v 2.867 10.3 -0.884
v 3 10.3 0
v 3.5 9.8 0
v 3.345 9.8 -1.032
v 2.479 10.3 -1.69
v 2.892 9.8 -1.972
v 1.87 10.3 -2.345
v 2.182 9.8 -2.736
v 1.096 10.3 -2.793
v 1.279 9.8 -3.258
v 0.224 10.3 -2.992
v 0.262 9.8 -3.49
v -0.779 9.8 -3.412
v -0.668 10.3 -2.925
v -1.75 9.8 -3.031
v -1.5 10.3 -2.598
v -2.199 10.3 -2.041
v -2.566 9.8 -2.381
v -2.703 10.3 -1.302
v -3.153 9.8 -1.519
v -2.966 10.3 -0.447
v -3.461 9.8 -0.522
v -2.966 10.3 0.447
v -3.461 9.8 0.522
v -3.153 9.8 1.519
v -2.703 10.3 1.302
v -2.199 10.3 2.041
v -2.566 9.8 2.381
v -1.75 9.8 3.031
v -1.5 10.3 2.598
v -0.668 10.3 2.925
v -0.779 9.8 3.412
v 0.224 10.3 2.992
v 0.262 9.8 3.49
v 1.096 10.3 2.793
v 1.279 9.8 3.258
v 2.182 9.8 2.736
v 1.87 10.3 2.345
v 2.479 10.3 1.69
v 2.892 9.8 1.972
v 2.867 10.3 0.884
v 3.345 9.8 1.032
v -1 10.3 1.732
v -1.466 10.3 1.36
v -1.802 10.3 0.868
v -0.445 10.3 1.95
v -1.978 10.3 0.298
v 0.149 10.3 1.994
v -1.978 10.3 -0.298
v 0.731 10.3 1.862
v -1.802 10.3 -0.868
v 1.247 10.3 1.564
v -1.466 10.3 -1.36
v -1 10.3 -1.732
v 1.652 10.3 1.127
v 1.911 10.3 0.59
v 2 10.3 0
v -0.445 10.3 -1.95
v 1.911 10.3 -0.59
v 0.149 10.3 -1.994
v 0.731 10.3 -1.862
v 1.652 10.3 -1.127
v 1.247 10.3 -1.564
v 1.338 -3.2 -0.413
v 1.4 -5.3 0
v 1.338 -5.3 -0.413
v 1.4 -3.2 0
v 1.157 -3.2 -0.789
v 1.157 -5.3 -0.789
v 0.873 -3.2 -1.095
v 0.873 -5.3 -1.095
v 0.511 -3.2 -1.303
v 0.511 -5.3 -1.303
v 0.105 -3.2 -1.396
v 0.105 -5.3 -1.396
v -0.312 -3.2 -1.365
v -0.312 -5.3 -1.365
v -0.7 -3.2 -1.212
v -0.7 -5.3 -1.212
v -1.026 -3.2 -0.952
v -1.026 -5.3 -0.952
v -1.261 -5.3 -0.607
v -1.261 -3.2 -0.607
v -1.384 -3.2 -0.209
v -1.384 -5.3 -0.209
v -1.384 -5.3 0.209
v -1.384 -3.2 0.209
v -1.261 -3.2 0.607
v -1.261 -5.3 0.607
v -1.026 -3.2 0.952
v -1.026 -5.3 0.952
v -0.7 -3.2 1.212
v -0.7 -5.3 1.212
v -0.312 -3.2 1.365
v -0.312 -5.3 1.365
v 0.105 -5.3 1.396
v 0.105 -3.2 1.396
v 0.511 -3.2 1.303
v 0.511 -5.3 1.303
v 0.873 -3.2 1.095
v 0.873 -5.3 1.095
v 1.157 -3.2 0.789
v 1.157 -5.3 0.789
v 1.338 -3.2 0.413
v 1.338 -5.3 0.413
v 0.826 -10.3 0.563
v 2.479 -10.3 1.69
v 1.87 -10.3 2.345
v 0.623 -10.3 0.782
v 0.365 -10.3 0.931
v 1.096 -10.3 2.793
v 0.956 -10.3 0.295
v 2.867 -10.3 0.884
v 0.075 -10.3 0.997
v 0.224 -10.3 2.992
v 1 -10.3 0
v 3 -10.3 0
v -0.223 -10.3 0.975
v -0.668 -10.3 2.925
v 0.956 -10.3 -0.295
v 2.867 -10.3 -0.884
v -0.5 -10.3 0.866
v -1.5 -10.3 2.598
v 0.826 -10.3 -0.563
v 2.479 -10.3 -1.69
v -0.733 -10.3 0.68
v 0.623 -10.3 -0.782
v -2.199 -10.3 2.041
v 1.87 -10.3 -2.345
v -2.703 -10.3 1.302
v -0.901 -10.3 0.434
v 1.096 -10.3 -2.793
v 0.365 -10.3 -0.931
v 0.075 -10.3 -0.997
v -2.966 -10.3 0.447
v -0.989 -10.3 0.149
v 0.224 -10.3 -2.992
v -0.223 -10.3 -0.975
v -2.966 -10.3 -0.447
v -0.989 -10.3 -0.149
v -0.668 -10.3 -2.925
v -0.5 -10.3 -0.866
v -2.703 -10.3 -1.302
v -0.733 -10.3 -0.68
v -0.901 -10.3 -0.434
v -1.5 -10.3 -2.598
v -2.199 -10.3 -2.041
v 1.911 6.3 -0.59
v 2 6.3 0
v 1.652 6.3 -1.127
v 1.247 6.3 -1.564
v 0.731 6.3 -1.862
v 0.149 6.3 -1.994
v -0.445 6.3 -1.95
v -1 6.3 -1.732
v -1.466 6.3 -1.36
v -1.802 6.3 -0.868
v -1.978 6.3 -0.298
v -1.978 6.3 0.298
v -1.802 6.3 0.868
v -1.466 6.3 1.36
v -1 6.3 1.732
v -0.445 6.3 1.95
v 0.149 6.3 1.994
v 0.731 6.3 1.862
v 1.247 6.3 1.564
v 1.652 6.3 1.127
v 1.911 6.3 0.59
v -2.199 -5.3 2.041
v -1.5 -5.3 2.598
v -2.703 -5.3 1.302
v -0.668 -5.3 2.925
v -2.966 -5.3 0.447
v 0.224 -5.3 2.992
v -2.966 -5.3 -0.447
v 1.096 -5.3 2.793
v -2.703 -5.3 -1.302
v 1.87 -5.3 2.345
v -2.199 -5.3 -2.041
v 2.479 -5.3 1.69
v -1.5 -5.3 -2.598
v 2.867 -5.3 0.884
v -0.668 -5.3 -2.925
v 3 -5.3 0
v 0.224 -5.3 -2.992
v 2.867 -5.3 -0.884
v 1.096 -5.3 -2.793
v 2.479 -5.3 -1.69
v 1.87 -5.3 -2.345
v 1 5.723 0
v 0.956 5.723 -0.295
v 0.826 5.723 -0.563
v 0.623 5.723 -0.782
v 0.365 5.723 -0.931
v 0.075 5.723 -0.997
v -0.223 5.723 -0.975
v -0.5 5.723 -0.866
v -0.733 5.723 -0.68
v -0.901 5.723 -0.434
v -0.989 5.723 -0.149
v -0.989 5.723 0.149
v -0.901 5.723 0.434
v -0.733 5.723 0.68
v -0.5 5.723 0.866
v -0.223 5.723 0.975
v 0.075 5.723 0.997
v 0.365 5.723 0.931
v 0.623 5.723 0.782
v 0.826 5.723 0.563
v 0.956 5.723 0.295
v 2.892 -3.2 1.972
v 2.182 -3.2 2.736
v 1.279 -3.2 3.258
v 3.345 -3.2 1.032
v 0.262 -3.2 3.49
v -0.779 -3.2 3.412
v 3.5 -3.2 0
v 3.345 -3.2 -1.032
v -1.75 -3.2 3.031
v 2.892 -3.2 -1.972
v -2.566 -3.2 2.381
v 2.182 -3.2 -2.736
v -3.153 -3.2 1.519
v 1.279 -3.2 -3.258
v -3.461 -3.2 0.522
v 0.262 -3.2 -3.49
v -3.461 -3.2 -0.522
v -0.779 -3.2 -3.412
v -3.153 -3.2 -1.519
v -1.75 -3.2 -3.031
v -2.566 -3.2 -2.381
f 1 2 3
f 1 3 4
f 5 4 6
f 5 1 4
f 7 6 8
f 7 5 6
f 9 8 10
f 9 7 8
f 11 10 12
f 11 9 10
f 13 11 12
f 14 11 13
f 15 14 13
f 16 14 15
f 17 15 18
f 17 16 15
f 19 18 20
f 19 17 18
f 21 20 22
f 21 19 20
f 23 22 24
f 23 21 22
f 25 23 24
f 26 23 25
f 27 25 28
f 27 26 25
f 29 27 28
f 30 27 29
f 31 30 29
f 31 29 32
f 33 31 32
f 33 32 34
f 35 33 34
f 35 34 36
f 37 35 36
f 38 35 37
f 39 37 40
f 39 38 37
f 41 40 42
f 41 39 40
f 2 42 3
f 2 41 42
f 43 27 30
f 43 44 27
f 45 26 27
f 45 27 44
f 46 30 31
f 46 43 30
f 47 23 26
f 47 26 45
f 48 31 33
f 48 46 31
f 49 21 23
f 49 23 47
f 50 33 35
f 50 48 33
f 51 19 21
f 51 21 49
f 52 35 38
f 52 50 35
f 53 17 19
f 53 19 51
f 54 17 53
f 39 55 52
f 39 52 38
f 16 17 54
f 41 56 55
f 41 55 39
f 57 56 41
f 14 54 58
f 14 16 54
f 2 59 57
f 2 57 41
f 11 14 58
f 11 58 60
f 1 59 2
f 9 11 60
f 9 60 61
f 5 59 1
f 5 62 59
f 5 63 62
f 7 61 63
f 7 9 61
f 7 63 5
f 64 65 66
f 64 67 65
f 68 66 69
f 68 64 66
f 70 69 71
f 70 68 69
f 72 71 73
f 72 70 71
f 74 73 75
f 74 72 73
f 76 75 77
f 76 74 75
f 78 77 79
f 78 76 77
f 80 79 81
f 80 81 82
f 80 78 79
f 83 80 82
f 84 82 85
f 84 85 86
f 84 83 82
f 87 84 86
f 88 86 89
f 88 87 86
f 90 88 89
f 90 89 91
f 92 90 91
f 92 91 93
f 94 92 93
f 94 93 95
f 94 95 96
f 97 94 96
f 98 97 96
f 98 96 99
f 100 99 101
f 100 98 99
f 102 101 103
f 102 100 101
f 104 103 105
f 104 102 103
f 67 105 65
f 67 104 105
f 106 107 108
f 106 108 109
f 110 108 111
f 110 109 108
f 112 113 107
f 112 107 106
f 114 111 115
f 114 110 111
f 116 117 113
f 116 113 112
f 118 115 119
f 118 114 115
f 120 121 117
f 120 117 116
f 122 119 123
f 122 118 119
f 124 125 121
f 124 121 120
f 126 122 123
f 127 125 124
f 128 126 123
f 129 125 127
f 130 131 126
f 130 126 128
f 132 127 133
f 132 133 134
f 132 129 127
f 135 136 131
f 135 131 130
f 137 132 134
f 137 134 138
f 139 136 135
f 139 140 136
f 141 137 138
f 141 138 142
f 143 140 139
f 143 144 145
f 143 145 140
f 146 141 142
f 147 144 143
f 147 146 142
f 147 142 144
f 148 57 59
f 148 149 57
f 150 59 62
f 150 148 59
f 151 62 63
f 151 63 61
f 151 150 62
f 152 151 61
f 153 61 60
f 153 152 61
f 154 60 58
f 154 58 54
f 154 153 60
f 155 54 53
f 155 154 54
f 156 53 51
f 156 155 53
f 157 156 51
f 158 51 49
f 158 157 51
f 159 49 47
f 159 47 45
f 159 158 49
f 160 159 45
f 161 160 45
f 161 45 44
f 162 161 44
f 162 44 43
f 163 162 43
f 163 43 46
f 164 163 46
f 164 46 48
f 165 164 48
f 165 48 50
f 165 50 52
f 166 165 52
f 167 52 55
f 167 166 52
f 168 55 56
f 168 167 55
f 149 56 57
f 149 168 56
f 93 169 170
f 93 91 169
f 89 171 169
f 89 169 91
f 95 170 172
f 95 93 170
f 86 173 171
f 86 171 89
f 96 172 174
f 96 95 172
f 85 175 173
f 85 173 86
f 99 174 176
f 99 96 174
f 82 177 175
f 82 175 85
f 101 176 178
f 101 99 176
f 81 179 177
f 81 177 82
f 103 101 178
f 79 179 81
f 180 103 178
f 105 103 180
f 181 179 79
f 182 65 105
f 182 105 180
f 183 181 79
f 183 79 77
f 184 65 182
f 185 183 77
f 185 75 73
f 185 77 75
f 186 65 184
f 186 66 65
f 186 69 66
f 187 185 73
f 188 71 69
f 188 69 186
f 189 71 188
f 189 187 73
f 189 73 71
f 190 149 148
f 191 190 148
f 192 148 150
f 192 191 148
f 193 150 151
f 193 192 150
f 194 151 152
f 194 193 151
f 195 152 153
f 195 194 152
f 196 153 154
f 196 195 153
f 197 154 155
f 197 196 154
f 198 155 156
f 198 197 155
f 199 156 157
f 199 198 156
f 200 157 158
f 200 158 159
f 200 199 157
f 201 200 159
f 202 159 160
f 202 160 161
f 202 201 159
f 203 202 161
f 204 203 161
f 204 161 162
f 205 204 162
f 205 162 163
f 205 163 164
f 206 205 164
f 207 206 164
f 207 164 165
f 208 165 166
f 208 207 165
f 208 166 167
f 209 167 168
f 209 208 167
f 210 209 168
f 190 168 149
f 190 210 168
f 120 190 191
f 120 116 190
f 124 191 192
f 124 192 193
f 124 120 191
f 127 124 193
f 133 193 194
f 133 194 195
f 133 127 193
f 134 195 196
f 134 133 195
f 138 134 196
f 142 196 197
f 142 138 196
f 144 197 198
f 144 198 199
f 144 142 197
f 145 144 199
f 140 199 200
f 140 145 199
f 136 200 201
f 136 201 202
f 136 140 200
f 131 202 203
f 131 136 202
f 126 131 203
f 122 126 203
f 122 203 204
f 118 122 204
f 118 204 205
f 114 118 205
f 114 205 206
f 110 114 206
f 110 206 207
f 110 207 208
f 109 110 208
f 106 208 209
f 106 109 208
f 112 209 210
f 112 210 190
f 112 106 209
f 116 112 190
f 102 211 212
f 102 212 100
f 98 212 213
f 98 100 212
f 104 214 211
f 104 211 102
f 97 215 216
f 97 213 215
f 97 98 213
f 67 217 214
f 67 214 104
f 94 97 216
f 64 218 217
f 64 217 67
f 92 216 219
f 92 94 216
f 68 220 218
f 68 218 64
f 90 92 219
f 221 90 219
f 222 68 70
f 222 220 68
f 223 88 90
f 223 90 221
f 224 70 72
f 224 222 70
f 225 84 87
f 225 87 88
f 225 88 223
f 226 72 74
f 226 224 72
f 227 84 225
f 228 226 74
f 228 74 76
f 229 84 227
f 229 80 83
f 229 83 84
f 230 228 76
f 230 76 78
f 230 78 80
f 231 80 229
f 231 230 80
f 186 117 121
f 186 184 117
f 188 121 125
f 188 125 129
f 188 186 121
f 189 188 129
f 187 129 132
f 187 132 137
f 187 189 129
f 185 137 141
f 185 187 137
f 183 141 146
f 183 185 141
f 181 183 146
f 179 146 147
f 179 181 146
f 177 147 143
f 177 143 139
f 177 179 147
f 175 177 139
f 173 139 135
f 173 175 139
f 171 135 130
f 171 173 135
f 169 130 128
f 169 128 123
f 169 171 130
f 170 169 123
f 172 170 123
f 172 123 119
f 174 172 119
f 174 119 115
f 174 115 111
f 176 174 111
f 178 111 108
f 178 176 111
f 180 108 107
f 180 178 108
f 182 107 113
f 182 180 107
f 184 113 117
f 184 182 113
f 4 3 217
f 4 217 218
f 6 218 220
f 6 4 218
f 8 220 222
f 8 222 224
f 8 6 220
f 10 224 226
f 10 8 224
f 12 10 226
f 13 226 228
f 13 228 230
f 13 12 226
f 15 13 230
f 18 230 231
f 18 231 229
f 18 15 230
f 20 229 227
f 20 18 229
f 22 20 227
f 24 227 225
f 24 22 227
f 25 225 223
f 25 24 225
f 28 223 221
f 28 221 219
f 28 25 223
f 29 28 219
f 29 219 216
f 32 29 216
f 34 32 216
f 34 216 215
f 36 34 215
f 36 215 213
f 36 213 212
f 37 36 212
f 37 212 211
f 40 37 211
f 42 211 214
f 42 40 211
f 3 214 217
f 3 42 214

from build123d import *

# Parameters (mm, degrees)
CHAMFER1_SIZE = 0.5


with BuildPart() as part:
    # Sketch1 → Revolve1 (revolve)
    with BuildSketch(Plane.XY):
        Polygon((1, -10.3), (3, -10.3), (3, -5.3), (1.4, -5.3), (1.4, -3.2), (3.5, -3.2), (3.5, 10.3), (2, 10.3), (2, 6.3), (1, 5.722649731), align=None)
    revolve(axis=Axis((0, -10.3, 0), (0, 1, 0)))

    # Chamfer1
    chamfer1_edges = [part.edges().sort_by_distance(p)[0] for p in [
        (-3.5, 10.3, 0),
    ]]
    chamfer(chamfer1_edges, length=CHAMFER1_SIZE)


solid = part.part
